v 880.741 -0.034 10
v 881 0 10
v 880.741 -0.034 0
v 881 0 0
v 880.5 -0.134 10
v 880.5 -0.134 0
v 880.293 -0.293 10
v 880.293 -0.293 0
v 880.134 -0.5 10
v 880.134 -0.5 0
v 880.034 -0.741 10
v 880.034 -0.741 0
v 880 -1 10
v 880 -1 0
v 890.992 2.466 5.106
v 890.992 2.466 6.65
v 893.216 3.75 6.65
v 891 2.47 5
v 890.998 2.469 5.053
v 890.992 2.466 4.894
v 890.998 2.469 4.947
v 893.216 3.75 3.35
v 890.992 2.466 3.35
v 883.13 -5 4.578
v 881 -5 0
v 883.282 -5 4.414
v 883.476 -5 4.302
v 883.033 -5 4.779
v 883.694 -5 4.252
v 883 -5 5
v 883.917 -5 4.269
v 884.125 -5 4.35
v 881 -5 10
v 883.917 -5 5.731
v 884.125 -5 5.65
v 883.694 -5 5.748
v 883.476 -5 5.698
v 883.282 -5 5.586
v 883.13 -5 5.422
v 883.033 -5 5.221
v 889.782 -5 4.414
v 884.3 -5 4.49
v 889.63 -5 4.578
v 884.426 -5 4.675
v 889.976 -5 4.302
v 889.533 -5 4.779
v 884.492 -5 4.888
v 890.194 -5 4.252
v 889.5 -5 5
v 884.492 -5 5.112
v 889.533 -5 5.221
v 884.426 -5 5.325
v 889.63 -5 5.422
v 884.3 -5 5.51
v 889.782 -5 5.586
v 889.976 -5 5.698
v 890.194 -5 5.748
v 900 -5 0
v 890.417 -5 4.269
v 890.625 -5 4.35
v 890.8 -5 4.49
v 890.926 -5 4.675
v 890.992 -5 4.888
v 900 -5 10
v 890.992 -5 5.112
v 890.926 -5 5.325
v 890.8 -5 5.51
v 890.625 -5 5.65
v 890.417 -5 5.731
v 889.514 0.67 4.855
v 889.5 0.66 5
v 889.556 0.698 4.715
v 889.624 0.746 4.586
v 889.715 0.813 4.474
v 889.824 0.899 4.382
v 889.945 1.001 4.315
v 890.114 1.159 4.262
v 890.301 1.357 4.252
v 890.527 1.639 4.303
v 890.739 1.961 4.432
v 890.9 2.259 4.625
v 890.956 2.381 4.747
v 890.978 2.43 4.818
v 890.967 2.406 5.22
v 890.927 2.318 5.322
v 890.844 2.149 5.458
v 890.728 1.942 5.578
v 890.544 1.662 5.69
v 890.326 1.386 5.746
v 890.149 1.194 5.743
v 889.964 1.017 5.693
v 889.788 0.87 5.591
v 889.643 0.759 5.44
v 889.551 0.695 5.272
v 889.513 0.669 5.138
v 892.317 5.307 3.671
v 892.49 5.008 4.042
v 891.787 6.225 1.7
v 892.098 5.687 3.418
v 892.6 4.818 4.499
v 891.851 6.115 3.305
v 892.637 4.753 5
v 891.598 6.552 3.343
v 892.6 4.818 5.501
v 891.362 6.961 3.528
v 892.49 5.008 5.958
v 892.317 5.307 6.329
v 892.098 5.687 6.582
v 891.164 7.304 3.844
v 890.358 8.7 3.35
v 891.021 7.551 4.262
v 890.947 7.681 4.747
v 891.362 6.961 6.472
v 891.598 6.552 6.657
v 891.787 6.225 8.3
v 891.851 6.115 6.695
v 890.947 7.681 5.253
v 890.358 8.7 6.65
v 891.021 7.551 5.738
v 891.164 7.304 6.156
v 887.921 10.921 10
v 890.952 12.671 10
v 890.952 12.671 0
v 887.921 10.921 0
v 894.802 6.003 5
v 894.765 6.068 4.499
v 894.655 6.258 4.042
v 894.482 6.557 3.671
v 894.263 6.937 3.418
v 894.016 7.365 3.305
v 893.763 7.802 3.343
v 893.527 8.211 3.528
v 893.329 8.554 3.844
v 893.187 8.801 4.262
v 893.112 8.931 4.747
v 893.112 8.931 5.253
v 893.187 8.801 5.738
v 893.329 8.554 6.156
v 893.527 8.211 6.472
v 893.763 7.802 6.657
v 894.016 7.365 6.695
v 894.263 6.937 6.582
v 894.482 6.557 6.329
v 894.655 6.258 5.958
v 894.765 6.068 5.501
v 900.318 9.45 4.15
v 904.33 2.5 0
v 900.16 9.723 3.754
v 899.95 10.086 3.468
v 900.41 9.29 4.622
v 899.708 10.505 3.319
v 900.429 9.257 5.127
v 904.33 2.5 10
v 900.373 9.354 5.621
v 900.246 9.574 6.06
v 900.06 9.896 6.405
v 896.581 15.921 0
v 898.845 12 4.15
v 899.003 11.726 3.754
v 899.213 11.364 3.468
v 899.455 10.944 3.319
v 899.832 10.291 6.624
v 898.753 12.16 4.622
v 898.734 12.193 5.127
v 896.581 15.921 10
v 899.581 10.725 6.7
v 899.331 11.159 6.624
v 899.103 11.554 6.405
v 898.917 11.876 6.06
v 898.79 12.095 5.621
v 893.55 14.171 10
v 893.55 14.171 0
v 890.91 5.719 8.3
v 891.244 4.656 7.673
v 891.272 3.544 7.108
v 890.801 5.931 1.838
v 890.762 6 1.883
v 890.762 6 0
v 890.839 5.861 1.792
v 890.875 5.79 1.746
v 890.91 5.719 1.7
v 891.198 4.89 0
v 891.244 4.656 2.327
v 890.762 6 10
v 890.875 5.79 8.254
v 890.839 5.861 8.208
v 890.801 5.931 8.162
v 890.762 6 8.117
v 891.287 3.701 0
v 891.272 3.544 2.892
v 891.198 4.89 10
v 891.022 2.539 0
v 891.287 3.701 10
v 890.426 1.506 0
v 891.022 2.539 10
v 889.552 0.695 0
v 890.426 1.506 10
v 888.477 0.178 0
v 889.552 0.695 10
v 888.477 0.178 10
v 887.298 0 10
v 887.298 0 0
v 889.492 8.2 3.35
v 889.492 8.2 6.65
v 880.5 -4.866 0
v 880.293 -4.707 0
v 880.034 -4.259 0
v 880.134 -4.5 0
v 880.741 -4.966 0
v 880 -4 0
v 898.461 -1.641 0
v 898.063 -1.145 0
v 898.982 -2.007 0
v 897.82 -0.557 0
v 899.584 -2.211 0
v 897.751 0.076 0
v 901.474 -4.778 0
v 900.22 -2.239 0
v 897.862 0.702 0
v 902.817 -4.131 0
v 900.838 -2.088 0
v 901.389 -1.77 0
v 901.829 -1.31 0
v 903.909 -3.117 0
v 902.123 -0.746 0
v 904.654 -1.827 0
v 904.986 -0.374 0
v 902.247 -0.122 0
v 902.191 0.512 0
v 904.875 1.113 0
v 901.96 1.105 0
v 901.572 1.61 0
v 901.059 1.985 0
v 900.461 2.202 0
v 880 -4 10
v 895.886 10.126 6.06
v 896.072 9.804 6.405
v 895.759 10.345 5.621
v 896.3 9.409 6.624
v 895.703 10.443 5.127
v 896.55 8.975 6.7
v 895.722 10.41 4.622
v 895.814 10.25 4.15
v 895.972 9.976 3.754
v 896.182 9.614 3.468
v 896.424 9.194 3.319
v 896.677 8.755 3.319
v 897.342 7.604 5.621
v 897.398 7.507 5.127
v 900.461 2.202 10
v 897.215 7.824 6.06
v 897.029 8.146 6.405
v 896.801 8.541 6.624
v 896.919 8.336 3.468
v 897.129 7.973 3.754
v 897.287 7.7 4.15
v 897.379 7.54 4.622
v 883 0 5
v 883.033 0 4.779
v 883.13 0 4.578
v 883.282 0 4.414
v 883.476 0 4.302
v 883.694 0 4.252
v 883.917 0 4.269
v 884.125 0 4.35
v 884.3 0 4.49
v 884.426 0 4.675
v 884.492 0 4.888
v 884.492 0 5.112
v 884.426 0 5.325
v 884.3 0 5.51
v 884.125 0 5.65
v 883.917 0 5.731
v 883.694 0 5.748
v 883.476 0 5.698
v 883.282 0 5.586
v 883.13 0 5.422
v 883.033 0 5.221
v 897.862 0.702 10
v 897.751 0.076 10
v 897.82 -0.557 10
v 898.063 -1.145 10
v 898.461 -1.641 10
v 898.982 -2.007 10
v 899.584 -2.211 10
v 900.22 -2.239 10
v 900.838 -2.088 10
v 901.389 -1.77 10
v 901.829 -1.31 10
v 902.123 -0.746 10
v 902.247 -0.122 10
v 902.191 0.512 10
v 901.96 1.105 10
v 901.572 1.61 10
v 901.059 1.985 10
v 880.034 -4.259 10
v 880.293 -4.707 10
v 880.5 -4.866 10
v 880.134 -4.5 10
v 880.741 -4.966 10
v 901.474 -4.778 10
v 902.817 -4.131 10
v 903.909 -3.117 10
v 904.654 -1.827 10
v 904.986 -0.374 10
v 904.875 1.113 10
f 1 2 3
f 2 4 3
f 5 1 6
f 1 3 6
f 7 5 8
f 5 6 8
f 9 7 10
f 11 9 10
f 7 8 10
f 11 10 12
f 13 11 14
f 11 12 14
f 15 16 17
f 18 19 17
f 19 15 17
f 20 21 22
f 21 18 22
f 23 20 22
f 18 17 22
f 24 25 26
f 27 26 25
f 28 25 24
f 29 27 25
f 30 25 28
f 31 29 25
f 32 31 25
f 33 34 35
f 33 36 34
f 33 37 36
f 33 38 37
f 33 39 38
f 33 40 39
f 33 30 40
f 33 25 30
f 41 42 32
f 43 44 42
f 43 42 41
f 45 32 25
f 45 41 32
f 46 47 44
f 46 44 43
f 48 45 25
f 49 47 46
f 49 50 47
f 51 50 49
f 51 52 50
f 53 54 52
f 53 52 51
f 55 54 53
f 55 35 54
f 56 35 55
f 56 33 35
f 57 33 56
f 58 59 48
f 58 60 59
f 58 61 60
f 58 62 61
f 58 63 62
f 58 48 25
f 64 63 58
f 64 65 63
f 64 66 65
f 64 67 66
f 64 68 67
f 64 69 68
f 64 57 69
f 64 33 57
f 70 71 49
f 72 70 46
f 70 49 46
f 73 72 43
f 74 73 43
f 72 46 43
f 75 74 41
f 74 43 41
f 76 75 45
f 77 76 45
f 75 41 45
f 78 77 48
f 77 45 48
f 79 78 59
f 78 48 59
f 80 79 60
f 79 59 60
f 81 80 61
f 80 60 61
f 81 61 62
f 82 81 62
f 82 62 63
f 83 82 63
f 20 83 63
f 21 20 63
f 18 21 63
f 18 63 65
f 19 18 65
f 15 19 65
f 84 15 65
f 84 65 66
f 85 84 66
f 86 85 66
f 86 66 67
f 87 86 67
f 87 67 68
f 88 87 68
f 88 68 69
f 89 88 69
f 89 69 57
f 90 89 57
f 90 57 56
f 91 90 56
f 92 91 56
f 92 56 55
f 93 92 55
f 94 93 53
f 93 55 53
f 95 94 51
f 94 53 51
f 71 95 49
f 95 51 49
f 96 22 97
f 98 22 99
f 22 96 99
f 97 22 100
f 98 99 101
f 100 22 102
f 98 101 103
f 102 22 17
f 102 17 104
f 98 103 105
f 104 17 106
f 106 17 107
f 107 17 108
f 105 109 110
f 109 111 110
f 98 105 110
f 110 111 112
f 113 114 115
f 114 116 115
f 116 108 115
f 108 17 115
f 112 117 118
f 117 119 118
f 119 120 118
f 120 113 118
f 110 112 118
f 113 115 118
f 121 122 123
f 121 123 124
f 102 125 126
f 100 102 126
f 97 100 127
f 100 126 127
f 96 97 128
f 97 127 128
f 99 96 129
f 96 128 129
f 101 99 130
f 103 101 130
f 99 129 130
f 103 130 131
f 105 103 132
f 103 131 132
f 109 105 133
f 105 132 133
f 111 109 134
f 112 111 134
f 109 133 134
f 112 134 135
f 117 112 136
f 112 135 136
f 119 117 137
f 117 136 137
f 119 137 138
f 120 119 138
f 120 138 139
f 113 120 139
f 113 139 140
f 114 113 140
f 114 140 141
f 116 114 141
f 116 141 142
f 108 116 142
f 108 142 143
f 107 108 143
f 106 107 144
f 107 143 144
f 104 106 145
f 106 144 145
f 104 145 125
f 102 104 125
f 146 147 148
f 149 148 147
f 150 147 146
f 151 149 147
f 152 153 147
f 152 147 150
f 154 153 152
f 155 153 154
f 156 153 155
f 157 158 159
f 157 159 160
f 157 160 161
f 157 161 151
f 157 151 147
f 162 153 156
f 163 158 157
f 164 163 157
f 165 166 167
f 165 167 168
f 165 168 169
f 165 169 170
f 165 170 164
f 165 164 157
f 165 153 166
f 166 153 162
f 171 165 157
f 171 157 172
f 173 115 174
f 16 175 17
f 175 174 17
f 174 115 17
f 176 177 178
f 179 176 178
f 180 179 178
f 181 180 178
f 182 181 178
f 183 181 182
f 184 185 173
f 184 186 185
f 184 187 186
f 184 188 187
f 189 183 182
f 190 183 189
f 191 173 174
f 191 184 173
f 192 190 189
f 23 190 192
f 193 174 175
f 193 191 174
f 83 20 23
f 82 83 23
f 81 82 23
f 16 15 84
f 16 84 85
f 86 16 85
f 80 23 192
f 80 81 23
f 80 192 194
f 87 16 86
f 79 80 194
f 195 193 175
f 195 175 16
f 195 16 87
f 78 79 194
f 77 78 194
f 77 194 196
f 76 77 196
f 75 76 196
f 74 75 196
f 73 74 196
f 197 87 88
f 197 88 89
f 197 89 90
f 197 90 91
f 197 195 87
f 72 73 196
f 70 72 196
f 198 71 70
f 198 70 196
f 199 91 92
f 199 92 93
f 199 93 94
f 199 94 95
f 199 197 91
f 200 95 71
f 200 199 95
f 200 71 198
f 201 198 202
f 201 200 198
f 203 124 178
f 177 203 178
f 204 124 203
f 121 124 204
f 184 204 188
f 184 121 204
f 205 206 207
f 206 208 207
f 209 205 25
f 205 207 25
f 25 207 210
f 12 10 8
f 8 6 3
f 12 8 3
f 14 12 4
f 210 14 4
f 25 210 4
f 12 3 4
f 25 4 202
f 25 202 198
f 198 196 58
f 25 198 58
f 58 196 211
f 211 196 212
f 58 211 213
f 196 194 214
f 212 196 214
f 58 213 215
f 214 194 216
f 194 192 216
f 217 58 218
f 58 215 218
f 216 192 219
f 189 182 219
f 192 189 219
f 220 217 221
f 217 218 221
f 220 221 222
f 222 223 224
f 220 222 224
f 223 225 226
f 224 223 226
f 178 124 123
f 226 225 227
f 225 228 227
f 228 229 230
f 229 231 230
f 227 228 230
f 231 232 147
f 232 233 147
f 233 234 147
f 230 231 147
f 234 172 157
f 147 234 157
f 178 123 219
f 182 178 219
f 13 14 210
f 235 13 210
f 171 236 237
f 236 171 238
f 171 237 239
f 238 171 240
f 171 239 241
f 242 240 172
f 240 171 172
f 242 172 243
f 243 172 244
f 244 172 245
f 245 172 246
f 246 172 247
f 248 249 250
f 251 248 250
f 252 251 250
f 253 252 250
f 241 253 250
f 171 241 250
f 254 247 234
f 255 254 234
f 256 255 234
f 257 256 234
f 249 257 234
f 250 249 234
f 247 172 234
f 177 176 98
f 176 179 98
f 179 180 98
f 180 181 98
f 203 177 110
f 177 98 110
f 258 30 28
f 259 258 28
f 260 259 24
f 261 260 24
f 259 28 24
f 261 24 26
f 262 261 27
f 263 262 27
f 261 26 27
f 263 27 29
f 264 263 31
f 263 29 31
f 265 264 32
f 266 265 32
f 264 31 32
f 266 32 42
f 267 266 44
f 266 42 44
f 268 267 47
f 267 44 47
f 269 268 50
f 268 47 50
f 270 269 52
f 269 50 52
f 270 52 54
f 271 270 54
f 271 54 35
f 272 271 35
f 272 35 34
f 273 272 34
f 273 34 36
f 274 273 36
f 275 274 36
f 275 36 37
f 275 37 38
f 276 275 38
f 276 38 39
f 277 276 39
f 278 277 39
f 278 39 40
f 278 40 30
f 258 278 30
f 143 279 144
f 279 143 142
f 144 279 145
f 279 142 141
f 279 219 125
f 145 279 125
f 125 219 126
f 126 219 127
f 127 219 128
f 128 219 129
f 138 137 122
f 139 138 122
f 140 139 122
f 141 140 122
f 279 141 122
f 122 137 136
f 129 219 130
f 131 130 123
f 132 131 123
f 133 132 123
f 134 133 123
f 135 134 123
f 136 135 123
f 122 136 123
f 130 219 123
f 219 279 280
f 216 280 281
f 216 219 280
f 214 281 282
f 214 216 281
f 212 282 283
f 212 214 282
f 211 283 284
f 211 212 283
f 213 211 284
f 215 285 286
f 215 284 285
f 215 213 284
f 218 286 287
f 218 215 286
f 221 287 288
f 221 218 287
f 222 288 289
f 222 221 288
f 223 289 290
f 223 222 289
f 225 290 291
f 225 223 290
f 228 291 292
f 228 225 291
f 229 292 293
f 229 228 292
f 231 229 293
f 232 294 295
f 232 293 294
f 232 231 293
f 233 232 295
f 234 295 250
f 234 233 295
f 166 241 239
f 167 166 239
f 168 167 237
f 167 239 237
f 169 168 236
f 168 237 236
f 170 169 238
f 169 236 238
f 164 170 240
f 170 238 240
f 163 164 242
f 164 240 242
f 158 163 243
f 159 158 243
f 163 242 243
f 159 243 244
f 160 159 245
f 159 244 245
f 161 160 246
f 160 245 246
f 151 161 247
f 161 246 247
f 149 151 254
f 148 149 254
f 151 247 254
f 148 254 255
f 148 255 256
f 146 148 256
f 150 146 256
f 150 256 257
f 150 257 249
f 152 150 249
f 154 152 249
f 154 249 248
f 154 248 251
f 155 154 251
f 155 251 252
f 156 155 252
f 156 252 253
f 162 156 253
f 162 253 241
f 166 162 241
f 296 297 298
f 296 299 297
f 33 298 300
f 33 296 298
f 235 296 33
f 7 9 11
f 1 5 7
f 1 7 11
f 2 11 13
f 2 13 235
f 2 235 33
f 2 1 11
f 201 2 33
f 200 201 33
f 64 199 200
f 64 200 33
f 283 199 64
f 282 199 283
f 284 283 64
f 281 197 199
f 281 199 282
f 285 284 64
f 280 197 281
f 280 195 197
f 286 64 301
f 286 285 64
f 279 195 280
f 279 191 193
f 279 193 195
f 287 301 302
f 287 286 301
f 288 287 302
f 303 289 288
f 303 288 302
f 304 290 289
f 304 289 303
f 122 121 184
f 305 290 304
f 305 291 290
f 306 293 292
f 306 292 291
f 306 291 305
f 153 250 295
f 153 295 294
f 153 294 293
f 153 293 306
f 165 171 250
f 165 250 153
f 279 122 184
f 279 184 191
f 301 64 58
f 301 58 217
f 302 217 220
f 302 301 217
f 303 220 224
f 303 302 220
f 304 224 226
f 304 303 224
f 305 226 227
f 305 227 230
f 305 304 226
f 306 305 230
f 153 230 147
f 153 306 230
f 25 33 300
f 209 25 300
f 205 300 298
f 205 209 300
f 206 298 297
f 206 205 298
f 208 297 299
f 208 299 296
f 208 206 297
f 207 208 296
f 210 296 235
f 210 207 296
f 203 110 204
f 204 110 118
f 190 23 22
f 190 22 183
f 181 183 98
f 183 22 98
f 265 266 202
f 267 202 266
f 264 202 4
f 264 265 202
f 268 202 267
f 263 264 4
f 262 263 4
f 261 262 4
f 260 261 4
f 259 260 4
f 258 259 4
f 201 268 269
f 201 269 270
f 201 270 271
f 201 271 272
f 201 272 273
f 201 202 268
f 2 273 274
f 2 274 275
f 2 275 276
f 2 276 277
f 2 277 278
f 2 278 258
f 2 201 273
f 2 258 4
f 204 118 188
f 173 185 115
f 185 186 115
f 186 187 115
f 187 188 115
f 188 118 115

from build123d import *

# Parameters (mm, degrees)
EXTRUDE_1_DEPTH              = 10
CUT_EXTRUDE_1_DEPTH          = 906.195271262
CUT_EXTRUDE_2_REACH          = 458.977
SKETCH_4_W                   = 2.25
SKETCH_4_H                   = 10
HOLE_WIZARD_3_4_3_4_1_D      = 3.4
HOLE_WIZARD_3_4_3_4_1_DEPTH  = 3.5
HOLE_WIZARD_1_5_1_5_1_D      = 1.5
SKETCH_9_W                   = 1.7
SKETCH_9_H                   = 16.290640731
HOLE_WIZARD_1_5_1_5_2_REACH  = 907.297
HOLE_WIZARD_1_5_1_5_2_BORE_R = 0.75
FILLET_1_R                   = 1


with BuildPart() as part:
    # 草图1 → 凸台-拉伸1 (new body)
    with BuildSketch(Plane.XY.offset(10)):
        with BuildLine():
            Line((904.330127019, 2.5), (896.581493223, 15.921027424))
            Line((896.581493223, 15.921027424), (887.921239185, 10.921027424))
            Line((887.921239185, 10.921027424), (890.762395693, 6))
            ThreePointArc((890.762395693, 6), (890.762395693, 2), (887.298294078, 0))
            Line((887.298294078, 0), (880, 0))
            Line((880, 0), (880, -5))
            Line((880, -5), (900, -5))
            ThreePointArc((900, -5), (904.330127019, -2.5), (904.330127019, 2.5))
        make_face()
    extrude(amount=-EXTRUDE_1_DEPTH)

    # 草图2 → 切除-拉伸1 (cut, through all)
    with BuildSketch(Plane(origin=(0, 0, 0), x_dir=(-1, 0, 0), z_dir=(0, 0, -1))):
        with BuildLine():
            Line((-890.952328098, 12.671027424), (-893.55040431, 14.171027424))
            Line((-893.55040431, 14.171027424), (-900.460512614, 2.202368755))
            ThreePointArc((-900.460512614, 2.202368755), (-898.875, 1.948557159), (-897.862436403, 0.702368755))
            Line((-897.862436403, 0.702368755), (-890.952328098, 12.671027424))
        make_face()
    extrude(amount=-CUT_EXTRUDE_1_DEPTH, mode=Mode.SUBTRACT)

    # 草图3 → 切除-拉伸2 (cut, up to next)
    with BuildSketch(Plane(origin=(671.535898385, 387.711431703, 0), x_dir=(-0.4999999999999999, 0.8660254037844386, 0), z_dir=(0.8660254037844387, 0.49999999999999994, 0)), mode=Mode.PRIVATE) as cut_extrude_2_sk1:
        Polygon((-437.644848575, 6.65), (-440.502732408, 8.3), (-443.36061624, 6.65), (-443.36061624, 3.35), (-440.502732408, 1.7), (-437.644848575, 3.35), align=None)
    cut_extrude_2_tool1 = extrude(cut_extrude_2_sk1.sketch, amount=-CUT_EXTRUDE_2_REACH, mode=Mode.PRIVATE) & part.part
    add(cut_extrude_2_tool1.solids().sort_by_distance((891.787265, 6.224875, 5))[0], mode=Mode.SUBTRACT)

    # 草图4 → 切除-旋转1 (revolve, cut)
    with BuildSketch(Plane(origin=(0, 0, 0), x_dir=(1, 0, 0), z_dir=(0, 1, 0))):
        with Locations((901.125, -5)):
            Rectangle(SKETCH_4_W, SKETCH_4_H)
    revolve(axis=Axis((900, 0, 0), (0, 0, 1)), mode=Mode.SUBTRACT)

    # Ø3.4 (3.4) 直径孔1
    with Locations(Plane(origin=(679.330127019, 392.211431703, 0), x_dir=(0, 0, -1), z_dir=(0.8660254037844565, 0.4999999999999692, 0))):
        with Locations((-5, -440.502732408)):
            Hole(HOLE_WIZARD_3_4_3_4_1_D / 2, depth=HOLE_WIZARD_3_4_3_4_1_DEPTH)

    # Ø1.5 (1.5) 直径孔1 (through all)
    with Locations(Plane(origin=(0, 0, 0), x_dir=(1, 0, 0), z_dir=(0, 1, 0))):
        with Locations((883.75, -5)):
            Hole(HOLE_WIZARD_1_5_1_5_1_D / 2)

    # 草图9 → Ø3.4 (3.4) 直径孔2 (revolve, cut)
    with BuildSketch(Plane(origin=(891.787264589, 6.224875001, 5), x_dir=(0.49999999999991085, -0.8660254037844902, 0), z_dir=(0, 0, 1))):
        with Locations((0.85, 8.145320365)):
            Rectangle(SKETCH_9_W, SKETCH_9_H)
    revolve(axis=Axis((886.288003275, 3.049875001, 5), (0.8660254037844902, 0.4999999999999106, 0)), mode=Mode.SUBTRACT)

    # Ø1.5 (1.5) 直径孔2 bore → Ø1.5 (1.5) 直径孔2 (cut, up to next)
    with BuildSketch(Plane(origin=(0, -5, 0), x_dir=(-1, 0, 0), z_dir=(0, -1, 0)), mode=Mode.PRIVATE) as hole_wizard_1_5_1_5_2_sk1:
        with Locations((-890.25, -5)):
            Circle(HOLE_WIZARD_1_5_1_5_2_BORE_R)
    hole_wizard_1_5_1_5_2_tool1 = extrude(hole_wizard_1_5_1_5_2_sk1.sketch, amount=-HOLE_WIZARD_1_5_1_5_2_REACH, mode=Mode.PRIVATE) & part.part
    add(hole_wizard_1_5_1_5_2_tool1.solids().sort_by_distance((890.25, -5, 5))[0], mode=Mode.SUBTRACT)

    # 圆角1
    fillet_1_edges = [part.edges().sort_by_distance(p)[0] for p in [
        (880, -5, 5),
        (880, 0, 5),
    ]]
    fillet(fillet_1_edges, radius=FILLET_1_R)


solid = part.part
